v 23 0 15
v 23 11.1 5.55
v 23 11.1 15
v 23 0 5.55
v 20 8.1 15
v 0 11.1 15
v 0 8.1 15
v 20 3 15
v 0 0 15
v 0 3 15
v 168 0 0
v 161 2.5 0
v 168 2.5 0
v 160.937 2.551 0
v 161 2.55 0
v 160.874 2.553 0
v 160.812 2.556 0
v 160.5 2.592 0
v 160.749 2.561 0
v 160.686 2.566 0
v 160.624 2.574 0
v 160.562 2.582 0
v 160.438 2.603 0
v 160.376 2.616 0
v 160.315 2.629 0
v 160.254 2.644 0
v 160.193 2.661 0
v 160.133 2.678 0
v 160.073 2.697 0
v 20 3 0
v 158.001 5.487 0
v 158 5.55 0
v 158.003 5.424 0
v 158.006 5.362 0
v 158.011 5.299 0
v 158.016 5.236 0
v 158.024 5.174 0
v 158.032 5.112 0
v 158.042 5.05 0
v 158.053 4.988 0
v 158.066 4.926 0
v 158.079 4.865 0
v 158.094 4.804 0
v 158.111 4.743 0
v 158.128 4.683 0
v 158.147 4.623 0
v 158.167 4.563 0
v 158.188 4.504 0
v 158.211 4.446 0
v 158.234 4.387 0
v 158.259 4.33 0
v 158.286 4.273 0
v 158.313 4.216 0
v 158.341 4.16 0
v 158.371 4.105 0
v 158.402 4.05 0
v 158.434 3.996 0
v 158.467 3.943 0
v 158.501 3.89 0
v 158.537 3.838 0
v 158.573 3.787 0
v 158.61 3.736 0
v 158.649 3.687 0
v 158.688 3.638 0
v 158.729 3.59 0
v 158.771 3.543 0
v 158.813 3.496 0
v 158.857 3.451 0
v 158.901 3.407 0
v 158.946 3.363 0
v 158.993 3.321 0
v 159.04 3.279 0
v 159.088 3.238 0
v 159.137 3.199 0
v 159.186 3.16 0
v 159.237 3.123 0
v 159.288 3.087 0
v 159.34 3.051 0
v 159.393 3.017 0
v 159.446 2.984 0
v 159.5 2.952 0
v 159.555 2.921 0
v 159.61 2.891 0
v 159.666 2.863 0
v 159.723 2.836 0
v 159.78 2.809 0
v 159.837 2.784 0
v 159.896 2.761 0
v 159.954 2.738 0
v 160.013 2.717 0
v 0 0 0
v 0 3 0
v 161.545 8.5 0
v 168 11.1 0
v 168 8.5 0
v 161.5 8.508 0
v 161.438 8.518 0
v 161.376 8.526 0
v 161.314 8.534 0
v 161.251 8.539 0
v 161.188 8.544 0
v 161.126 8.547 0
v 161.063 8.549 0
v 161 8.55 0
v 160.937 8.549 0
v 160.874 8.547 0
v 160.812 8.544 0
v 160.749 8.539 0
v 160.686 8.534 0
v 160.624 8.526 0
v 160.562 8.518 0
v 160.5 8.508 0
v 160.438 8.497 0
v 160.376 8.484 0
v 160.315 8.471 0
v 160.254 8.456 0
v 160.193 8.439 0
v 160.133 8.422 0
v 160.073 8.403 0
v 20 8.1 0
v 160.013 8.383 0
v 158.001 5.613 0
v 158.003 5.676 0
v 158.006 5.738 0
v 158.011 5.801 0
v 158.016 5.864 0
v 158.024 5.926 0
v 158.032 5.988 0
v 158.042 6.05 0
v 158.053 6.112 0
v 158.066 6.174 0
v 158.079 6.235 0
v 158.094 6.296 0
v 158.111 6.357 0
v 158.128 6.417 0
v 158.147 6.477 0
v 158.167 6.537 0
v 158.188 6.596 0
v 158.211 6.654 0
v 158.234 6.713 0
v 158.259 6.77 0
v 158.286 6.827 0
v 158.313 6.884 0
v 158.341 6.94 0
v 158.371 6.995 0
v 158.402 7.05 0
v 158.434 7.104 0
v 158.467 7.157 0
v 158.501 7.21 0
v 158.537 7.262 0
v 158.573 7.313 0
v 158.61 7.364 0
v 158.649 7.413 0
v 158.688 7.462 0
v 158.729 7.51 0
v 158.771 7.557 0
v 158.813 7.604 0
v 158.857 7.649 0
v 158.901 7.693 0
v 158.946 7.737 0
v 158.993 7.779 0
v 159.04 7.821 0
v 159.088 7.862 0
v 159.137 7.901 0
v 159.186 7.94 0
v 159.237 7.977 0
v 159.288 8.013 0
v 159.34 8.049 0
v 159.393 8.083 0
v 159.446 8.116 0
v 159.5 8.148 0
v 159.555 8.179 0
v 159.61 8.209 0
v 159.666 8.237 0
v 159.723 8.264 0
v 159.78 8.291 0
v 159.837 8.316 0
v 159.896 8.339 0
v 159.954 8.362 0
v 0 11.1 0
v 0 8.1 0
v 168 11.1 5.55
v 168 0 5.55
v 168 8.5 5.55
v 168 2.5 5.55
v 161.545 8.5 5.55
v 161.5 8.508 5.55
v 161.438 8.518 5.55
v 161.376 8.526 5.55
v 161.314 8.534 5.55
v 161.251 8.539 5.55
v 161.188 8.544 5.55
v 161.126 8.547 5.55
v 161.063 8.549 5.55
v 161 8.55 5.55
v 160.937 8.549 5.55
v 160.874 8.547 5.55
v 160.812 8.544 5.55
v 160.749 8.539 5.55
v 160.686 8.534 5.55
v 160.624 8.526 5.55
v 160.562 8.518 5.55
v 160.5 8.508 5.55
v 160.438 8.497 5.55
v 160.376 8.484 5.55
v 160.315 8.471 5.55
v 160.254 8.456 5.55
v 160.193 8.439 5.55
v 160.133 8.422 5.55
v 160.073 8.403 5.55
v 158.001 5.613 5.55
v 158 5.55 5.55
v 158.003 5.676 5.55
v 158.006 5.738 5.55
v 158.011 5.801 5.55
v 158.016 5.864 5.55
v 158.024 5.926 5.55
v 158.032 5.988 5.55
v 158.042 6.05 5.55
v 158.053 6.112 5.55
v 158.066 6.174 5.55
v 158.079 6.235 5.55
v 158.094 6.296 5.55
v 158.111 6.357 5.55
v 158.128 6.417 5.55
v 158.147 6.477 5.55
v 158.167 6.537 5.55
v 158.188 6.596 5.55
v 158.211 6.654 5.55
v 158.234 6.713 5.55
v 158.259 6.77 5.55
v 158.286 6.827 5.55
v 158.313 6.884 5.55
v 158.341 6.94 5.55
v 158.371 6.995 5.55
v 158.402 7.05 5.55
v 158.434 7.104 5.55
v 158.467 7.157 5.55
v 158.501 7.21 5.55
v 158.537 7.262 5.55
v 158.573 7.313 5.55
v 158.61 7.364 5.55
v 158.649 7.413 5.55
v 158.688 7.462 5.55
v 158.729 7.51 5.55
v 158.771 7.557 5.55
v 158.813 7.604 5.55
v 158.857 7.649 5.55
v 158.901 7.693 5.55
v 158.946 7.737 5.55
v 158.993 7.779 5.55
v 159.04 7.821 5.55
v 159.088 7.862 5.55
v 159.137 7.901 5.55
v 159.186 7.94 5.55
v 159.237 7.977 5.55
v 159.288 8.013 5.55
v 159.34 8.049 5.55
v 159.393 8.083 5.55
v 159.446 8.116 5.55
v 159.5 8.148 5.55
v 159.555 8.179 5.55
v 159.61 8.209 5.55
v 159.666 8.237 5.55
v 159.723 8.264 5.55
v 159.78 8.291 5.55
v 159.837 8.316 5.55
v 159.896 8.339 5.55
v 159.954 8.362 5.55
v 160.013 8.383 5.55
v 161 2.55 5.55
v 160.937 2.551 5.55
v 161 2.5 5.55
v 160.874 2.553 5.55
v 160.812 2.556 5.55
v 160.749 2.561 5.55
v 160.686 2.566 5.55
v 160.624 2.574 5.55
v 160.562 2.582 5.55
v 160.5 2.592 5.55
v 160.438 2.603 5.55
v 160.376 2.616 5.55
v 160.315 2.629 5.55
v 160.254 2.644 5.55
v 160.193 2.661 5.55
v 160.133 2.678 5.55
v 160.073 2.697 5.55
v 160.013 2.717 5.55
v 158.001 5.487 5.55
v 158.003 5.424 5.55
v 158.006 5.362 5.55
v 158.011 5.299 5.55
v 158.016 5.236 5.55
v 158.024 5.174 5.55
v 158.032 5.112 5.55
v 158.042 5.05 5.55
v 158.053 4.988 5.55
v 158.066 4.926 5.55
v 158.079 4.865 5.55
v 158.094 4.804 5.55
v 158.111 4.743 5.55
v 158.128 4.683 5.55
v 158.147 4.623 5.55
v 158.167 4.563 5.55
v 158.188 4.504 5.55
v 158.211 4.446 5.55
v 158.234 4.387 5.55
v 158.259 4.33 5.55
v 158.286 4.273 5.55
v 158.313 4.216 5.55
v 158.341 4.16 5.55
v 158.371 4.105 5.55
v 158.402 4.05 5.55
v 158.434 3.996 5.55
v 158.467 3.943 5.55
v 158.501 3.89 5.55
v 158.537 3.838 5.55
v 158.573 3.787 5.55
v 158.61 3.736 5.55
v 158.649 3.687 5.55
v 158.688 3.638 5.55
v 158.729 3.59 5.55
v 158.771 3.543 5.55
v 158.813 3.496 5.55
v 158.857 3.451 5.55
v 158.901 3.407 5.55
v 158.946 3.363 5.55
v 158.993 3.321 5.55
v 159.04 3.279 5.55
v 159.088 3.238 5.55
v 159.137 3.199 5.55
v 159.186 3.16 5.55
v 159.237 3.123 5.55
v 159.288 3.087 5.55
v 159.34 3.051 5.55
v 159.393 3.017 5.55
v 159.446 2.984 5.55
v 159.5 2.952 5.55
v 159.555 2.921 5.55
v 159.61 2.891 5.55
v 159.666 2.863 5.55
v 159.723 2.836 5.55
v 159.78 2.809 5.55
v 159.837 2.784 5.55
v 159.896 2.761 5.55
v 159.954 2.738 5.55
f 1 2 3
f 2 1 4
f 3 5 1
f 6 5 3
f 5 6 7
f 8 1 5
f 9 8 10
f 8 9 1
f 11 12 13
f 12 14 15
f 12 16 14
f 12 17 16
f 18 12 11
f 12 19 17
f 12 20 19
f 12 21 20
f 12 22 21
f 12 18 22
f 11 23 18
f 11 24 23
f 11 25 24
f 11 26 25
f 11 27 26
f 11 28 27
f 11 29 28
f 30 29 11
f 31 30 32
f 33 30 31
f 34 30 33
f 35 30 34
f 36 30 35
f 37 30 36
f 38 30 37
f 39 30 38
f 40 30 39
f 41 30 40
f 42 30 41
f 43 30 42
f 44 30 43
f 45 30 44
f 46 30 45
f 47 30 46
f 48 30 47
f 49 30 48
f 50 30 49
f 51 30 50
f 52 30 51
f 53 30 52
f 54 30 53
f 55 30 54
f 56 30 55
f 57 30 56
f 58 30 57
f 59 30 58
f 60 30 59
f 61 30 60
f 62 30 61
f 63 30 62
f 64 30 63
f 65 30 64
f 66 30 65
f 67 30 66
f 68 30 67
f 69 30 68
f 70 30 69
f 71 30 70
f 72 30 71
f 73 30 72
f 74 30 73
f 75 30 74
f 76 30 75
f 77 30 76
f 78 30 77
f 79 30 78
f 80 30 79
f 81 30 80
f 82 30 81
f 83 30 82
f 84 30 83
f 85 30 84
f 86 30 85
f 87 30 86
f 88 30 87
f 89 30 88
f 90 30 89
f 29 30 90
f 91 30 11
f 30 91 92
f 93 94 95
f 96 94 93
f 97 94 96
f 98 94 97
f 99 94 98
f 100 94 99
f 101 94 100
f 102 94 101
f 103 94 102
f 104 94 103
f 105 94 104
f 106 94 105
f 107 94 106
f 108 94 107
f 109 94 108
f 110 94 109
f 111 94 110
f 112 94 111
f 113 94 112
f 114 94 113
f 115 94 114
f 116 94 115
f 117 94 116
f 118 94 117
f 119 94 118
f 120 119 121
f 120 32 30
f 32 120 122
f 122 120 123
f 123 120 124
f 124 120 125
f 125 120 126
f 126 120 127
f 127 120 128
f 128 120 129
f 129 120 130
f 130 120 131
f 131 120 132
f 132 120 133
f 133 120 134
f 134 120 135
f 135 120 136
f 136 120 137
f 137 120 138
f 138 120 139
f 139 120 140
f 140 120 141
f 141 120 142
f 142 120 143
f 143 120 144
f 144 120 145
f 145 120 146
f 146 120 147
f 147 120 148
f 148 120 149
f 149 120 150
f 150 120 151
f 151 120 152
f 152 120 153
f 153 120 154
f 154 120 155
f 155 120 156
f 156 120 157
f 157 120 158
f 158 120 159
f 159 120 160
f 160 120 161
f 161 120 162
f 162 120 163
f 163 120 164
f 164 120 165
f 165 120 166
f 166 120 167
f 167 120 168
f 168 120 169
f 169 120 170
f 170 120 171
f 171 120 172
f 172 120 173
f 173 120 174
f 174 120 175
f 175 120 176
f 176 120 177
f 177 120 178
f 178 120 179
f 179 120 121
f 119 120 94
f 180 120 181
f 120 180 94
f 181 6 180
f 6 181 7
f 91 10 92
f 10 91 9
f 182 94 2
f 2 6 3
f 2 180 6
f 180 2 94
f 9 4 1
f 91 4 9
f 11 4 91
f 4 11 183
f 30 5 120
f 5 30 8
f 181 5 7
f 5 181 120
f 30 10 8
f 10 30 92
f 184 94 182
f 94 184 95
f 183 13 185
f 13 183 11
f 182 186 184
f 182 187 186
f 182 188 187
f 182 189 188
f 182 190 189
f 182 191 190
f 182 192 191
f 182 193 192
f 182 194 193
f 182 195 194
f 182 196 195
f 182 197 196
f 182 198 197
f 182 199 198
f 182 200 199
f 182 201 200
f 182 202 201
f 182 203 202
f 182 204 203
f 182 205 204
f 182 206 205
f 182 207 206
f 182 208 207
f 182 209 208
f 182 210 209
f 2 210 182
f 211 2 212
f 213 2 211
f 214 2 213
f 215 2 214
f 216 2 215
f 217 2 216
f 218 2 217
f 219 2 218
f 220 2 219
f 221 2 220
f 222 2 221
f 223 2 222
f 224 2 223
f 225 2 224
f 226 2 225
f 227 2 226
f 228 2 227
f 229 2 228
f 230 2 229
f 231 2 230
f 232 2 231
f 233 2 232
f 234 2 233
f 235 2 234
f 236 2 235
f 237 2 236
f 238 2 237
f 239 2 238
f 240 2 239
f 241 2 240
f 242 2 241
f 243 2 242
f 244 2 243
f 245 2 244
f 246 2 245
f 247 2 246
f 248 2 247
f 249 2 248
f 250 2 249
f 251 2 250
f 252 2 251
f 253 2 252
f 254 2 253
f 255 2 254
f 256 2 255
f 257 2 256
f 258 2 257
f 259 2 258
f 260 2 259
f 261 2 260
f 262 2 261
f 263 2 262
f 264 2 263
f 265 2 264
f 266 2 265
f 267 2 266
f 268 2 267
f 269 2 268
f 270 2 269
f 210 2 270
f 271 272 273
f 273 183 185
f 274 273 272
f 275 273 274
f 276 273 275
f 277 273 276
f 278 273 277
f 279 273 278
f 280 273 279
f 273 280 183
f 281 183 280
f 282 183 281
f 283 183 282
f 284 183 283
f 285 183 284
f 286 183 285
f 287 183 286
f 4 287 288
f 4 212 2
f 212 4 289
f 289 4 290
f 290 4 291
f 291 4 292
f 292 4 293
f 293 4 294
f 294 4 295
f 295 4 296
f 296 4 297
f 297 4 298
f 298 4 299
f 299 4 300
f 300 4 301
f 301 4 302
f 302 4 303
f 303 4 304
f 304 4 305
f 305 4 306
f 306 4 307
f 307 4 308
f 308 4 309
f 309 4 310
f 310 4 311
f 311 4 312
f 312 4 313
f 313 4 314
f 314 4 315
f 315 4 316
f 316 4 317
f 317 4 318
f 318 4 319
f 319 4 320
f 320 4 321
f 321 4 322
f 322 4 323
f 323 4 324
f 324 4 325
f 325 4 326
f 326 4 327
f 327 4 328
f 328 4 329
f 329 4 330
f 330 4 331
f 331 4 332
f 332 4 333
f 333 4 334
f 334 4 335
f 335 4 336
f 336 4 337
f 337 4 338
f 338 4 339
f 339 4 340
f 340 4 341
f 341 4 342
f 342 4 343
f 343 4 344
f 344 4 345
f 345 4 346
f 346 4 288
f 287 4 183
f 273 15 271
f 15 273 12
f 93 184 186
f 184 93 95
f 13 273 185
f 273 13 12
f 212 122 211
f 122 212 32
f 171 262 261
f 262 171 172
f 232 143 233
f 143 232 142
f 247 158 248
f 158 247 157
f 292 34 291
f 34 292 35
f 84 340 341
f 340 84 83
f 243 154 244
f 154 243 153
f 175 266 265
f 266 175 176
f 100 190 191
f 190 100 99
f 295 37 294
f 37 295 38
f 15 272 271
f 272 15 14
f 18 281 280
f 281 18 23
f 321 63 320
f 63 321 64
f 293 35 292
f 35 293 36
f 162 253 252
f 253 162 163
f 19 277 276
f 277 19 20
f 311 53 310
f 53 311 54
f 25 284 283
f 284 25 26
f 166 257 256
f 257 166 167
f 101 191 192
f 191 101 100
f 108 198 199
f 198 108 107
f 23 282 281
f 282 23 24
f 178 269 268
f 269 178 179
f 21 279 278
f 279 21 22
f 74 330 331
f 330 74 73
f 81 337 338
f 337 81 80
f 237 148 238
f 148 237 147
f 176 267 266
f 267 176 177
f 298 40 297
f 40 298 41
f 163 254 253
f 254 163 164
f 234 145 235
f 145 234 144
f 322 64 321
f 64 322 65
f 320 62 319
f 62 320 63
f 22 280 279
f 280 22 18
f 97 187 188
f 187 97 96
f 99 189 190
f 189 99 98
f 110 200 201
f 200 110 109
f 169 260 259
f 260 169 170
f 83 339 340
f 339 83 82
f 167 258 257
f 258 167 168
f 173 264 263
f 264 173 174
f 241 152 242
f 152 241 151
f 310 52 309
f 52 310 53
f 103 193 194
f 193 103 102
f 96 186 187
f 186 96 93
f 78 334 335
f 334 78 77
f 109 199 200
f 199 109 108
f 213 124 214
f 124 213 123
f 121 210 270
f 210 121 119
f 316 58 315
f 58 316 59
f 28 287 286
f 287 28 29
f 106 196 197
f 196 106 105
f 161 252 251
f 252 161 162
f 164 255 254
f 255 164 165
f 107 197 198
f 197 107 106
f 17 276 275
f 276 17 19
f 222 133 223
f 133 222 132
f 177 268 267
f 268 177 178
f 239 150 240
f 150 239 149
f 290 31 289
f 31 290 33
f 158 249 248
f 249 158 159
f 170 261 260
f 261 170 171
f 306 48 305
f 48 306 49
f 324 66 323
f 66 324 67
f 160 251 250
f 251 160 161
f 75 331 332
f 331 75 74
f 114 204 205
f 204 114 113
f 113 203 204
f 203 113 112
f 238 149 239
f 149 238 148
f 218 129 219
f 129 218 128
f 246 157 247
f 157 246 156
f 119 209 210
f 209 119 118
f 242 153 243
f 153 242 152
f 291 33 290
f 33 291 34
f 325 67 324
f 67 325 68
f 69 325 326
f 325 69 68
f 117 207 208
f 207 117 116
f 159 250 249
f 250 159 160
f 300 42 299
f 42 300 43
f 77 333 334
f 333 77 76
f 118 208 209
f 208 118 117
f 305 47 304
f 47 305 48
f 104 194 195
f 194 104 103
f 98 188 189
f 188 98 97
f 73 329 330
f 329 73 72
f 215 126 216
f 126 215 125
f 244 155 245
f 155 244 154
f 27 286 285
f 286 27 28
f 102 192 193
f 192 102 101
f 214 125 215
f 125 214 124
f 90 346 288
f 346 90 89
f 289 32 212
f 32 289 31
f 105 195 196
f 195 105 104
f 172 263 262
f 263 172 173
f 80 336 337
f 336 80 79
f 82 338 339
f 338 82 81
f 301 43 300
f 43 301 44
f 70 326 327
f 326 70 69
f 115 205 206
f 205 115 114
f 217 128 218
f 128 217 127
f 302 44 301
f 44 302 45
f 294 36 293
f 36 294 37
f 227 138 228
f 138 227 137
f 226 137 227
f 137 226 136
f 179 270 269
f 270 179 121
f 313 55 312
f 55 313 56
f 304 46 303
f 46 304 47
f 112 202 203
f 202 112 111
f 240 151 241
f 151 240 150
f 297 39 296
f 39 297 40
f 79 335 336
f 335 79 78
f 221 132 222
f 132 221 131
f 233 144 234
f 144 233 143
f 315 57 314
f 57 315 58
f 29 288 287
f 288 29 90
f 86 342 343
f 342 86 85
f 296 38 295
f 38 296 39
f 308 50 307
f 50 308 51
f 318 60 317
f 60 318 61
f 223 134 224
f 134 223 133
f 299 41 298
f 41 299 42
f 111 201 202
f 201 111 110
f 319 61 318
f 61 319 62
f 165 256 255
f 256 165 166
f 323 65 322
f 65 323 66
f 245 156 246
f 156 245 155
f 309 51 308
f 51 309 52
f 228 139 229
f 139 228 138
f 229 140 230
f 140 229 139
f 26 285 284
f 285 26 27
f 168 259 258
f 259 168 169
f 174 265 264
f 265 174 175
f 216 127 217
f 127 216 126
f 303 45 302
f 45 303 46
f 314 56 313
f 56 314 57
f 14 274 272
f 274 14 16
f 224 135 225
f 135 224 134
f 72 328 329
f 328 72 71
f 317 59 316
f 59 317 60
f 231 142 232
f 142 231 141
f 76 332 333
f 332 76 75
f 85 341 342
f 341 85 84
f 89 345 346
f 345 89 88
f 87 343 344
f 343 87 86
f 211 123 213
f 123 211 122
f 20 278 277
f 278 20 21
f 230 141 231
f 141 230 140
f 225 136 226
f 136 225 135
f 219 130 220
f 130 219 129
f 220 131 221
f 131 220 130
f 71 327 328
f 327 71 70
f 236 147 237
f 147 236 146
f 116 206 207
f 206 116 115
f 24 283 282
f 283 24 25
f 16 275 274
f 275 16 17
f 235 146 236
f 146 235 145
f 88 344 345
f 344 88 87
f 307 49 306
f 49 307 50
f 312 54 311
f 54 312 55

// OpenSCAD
$fn = 300;

// Base frame
vBsHg = 20;     // height of the Prusa's frame
vBsFm = 5.1;    // thickness of the Prusa's frame
vBsTk = 3;      // thickness of the support
vBsWd = 15;     // width of the support

// Column
vClmHg = 135;   // height from the base
vClmDm = vBsFm+2*vBsTk;    // diameter

// Top hub
vHbDm = 10;     // height of the hub
vShDm = 6;      // internal diameter for the shaft

union() {
// Base support
difference() {
    cube([vBsHg+vBsTk, vBsFm+2*vBsTk, vBsWd]);
    translate([0,vBsTk,0])
        cube([vBsHg,vBsFm,vBsWd])
    ;
};
// Column
translate([vBsHg+vBsTk,0,0])
        cube([vClmHg,vClmDm,vClmDm/2]);
;

// Top hub
translate([vBsHg+vBsTk+vClmHg,0,0])
        difference() {
            cube([vHbDm,vClmDm,vClmDm/2]);
            translate([vShDm/2,vHbDm/4,0])
                cube([vHbDm,vShDm,vClmDm/2]);
            translate([vShDm/2,vClmDm/2,0])
                cylinder(d=vShDm,h=vClmDm/2);
        }
};
